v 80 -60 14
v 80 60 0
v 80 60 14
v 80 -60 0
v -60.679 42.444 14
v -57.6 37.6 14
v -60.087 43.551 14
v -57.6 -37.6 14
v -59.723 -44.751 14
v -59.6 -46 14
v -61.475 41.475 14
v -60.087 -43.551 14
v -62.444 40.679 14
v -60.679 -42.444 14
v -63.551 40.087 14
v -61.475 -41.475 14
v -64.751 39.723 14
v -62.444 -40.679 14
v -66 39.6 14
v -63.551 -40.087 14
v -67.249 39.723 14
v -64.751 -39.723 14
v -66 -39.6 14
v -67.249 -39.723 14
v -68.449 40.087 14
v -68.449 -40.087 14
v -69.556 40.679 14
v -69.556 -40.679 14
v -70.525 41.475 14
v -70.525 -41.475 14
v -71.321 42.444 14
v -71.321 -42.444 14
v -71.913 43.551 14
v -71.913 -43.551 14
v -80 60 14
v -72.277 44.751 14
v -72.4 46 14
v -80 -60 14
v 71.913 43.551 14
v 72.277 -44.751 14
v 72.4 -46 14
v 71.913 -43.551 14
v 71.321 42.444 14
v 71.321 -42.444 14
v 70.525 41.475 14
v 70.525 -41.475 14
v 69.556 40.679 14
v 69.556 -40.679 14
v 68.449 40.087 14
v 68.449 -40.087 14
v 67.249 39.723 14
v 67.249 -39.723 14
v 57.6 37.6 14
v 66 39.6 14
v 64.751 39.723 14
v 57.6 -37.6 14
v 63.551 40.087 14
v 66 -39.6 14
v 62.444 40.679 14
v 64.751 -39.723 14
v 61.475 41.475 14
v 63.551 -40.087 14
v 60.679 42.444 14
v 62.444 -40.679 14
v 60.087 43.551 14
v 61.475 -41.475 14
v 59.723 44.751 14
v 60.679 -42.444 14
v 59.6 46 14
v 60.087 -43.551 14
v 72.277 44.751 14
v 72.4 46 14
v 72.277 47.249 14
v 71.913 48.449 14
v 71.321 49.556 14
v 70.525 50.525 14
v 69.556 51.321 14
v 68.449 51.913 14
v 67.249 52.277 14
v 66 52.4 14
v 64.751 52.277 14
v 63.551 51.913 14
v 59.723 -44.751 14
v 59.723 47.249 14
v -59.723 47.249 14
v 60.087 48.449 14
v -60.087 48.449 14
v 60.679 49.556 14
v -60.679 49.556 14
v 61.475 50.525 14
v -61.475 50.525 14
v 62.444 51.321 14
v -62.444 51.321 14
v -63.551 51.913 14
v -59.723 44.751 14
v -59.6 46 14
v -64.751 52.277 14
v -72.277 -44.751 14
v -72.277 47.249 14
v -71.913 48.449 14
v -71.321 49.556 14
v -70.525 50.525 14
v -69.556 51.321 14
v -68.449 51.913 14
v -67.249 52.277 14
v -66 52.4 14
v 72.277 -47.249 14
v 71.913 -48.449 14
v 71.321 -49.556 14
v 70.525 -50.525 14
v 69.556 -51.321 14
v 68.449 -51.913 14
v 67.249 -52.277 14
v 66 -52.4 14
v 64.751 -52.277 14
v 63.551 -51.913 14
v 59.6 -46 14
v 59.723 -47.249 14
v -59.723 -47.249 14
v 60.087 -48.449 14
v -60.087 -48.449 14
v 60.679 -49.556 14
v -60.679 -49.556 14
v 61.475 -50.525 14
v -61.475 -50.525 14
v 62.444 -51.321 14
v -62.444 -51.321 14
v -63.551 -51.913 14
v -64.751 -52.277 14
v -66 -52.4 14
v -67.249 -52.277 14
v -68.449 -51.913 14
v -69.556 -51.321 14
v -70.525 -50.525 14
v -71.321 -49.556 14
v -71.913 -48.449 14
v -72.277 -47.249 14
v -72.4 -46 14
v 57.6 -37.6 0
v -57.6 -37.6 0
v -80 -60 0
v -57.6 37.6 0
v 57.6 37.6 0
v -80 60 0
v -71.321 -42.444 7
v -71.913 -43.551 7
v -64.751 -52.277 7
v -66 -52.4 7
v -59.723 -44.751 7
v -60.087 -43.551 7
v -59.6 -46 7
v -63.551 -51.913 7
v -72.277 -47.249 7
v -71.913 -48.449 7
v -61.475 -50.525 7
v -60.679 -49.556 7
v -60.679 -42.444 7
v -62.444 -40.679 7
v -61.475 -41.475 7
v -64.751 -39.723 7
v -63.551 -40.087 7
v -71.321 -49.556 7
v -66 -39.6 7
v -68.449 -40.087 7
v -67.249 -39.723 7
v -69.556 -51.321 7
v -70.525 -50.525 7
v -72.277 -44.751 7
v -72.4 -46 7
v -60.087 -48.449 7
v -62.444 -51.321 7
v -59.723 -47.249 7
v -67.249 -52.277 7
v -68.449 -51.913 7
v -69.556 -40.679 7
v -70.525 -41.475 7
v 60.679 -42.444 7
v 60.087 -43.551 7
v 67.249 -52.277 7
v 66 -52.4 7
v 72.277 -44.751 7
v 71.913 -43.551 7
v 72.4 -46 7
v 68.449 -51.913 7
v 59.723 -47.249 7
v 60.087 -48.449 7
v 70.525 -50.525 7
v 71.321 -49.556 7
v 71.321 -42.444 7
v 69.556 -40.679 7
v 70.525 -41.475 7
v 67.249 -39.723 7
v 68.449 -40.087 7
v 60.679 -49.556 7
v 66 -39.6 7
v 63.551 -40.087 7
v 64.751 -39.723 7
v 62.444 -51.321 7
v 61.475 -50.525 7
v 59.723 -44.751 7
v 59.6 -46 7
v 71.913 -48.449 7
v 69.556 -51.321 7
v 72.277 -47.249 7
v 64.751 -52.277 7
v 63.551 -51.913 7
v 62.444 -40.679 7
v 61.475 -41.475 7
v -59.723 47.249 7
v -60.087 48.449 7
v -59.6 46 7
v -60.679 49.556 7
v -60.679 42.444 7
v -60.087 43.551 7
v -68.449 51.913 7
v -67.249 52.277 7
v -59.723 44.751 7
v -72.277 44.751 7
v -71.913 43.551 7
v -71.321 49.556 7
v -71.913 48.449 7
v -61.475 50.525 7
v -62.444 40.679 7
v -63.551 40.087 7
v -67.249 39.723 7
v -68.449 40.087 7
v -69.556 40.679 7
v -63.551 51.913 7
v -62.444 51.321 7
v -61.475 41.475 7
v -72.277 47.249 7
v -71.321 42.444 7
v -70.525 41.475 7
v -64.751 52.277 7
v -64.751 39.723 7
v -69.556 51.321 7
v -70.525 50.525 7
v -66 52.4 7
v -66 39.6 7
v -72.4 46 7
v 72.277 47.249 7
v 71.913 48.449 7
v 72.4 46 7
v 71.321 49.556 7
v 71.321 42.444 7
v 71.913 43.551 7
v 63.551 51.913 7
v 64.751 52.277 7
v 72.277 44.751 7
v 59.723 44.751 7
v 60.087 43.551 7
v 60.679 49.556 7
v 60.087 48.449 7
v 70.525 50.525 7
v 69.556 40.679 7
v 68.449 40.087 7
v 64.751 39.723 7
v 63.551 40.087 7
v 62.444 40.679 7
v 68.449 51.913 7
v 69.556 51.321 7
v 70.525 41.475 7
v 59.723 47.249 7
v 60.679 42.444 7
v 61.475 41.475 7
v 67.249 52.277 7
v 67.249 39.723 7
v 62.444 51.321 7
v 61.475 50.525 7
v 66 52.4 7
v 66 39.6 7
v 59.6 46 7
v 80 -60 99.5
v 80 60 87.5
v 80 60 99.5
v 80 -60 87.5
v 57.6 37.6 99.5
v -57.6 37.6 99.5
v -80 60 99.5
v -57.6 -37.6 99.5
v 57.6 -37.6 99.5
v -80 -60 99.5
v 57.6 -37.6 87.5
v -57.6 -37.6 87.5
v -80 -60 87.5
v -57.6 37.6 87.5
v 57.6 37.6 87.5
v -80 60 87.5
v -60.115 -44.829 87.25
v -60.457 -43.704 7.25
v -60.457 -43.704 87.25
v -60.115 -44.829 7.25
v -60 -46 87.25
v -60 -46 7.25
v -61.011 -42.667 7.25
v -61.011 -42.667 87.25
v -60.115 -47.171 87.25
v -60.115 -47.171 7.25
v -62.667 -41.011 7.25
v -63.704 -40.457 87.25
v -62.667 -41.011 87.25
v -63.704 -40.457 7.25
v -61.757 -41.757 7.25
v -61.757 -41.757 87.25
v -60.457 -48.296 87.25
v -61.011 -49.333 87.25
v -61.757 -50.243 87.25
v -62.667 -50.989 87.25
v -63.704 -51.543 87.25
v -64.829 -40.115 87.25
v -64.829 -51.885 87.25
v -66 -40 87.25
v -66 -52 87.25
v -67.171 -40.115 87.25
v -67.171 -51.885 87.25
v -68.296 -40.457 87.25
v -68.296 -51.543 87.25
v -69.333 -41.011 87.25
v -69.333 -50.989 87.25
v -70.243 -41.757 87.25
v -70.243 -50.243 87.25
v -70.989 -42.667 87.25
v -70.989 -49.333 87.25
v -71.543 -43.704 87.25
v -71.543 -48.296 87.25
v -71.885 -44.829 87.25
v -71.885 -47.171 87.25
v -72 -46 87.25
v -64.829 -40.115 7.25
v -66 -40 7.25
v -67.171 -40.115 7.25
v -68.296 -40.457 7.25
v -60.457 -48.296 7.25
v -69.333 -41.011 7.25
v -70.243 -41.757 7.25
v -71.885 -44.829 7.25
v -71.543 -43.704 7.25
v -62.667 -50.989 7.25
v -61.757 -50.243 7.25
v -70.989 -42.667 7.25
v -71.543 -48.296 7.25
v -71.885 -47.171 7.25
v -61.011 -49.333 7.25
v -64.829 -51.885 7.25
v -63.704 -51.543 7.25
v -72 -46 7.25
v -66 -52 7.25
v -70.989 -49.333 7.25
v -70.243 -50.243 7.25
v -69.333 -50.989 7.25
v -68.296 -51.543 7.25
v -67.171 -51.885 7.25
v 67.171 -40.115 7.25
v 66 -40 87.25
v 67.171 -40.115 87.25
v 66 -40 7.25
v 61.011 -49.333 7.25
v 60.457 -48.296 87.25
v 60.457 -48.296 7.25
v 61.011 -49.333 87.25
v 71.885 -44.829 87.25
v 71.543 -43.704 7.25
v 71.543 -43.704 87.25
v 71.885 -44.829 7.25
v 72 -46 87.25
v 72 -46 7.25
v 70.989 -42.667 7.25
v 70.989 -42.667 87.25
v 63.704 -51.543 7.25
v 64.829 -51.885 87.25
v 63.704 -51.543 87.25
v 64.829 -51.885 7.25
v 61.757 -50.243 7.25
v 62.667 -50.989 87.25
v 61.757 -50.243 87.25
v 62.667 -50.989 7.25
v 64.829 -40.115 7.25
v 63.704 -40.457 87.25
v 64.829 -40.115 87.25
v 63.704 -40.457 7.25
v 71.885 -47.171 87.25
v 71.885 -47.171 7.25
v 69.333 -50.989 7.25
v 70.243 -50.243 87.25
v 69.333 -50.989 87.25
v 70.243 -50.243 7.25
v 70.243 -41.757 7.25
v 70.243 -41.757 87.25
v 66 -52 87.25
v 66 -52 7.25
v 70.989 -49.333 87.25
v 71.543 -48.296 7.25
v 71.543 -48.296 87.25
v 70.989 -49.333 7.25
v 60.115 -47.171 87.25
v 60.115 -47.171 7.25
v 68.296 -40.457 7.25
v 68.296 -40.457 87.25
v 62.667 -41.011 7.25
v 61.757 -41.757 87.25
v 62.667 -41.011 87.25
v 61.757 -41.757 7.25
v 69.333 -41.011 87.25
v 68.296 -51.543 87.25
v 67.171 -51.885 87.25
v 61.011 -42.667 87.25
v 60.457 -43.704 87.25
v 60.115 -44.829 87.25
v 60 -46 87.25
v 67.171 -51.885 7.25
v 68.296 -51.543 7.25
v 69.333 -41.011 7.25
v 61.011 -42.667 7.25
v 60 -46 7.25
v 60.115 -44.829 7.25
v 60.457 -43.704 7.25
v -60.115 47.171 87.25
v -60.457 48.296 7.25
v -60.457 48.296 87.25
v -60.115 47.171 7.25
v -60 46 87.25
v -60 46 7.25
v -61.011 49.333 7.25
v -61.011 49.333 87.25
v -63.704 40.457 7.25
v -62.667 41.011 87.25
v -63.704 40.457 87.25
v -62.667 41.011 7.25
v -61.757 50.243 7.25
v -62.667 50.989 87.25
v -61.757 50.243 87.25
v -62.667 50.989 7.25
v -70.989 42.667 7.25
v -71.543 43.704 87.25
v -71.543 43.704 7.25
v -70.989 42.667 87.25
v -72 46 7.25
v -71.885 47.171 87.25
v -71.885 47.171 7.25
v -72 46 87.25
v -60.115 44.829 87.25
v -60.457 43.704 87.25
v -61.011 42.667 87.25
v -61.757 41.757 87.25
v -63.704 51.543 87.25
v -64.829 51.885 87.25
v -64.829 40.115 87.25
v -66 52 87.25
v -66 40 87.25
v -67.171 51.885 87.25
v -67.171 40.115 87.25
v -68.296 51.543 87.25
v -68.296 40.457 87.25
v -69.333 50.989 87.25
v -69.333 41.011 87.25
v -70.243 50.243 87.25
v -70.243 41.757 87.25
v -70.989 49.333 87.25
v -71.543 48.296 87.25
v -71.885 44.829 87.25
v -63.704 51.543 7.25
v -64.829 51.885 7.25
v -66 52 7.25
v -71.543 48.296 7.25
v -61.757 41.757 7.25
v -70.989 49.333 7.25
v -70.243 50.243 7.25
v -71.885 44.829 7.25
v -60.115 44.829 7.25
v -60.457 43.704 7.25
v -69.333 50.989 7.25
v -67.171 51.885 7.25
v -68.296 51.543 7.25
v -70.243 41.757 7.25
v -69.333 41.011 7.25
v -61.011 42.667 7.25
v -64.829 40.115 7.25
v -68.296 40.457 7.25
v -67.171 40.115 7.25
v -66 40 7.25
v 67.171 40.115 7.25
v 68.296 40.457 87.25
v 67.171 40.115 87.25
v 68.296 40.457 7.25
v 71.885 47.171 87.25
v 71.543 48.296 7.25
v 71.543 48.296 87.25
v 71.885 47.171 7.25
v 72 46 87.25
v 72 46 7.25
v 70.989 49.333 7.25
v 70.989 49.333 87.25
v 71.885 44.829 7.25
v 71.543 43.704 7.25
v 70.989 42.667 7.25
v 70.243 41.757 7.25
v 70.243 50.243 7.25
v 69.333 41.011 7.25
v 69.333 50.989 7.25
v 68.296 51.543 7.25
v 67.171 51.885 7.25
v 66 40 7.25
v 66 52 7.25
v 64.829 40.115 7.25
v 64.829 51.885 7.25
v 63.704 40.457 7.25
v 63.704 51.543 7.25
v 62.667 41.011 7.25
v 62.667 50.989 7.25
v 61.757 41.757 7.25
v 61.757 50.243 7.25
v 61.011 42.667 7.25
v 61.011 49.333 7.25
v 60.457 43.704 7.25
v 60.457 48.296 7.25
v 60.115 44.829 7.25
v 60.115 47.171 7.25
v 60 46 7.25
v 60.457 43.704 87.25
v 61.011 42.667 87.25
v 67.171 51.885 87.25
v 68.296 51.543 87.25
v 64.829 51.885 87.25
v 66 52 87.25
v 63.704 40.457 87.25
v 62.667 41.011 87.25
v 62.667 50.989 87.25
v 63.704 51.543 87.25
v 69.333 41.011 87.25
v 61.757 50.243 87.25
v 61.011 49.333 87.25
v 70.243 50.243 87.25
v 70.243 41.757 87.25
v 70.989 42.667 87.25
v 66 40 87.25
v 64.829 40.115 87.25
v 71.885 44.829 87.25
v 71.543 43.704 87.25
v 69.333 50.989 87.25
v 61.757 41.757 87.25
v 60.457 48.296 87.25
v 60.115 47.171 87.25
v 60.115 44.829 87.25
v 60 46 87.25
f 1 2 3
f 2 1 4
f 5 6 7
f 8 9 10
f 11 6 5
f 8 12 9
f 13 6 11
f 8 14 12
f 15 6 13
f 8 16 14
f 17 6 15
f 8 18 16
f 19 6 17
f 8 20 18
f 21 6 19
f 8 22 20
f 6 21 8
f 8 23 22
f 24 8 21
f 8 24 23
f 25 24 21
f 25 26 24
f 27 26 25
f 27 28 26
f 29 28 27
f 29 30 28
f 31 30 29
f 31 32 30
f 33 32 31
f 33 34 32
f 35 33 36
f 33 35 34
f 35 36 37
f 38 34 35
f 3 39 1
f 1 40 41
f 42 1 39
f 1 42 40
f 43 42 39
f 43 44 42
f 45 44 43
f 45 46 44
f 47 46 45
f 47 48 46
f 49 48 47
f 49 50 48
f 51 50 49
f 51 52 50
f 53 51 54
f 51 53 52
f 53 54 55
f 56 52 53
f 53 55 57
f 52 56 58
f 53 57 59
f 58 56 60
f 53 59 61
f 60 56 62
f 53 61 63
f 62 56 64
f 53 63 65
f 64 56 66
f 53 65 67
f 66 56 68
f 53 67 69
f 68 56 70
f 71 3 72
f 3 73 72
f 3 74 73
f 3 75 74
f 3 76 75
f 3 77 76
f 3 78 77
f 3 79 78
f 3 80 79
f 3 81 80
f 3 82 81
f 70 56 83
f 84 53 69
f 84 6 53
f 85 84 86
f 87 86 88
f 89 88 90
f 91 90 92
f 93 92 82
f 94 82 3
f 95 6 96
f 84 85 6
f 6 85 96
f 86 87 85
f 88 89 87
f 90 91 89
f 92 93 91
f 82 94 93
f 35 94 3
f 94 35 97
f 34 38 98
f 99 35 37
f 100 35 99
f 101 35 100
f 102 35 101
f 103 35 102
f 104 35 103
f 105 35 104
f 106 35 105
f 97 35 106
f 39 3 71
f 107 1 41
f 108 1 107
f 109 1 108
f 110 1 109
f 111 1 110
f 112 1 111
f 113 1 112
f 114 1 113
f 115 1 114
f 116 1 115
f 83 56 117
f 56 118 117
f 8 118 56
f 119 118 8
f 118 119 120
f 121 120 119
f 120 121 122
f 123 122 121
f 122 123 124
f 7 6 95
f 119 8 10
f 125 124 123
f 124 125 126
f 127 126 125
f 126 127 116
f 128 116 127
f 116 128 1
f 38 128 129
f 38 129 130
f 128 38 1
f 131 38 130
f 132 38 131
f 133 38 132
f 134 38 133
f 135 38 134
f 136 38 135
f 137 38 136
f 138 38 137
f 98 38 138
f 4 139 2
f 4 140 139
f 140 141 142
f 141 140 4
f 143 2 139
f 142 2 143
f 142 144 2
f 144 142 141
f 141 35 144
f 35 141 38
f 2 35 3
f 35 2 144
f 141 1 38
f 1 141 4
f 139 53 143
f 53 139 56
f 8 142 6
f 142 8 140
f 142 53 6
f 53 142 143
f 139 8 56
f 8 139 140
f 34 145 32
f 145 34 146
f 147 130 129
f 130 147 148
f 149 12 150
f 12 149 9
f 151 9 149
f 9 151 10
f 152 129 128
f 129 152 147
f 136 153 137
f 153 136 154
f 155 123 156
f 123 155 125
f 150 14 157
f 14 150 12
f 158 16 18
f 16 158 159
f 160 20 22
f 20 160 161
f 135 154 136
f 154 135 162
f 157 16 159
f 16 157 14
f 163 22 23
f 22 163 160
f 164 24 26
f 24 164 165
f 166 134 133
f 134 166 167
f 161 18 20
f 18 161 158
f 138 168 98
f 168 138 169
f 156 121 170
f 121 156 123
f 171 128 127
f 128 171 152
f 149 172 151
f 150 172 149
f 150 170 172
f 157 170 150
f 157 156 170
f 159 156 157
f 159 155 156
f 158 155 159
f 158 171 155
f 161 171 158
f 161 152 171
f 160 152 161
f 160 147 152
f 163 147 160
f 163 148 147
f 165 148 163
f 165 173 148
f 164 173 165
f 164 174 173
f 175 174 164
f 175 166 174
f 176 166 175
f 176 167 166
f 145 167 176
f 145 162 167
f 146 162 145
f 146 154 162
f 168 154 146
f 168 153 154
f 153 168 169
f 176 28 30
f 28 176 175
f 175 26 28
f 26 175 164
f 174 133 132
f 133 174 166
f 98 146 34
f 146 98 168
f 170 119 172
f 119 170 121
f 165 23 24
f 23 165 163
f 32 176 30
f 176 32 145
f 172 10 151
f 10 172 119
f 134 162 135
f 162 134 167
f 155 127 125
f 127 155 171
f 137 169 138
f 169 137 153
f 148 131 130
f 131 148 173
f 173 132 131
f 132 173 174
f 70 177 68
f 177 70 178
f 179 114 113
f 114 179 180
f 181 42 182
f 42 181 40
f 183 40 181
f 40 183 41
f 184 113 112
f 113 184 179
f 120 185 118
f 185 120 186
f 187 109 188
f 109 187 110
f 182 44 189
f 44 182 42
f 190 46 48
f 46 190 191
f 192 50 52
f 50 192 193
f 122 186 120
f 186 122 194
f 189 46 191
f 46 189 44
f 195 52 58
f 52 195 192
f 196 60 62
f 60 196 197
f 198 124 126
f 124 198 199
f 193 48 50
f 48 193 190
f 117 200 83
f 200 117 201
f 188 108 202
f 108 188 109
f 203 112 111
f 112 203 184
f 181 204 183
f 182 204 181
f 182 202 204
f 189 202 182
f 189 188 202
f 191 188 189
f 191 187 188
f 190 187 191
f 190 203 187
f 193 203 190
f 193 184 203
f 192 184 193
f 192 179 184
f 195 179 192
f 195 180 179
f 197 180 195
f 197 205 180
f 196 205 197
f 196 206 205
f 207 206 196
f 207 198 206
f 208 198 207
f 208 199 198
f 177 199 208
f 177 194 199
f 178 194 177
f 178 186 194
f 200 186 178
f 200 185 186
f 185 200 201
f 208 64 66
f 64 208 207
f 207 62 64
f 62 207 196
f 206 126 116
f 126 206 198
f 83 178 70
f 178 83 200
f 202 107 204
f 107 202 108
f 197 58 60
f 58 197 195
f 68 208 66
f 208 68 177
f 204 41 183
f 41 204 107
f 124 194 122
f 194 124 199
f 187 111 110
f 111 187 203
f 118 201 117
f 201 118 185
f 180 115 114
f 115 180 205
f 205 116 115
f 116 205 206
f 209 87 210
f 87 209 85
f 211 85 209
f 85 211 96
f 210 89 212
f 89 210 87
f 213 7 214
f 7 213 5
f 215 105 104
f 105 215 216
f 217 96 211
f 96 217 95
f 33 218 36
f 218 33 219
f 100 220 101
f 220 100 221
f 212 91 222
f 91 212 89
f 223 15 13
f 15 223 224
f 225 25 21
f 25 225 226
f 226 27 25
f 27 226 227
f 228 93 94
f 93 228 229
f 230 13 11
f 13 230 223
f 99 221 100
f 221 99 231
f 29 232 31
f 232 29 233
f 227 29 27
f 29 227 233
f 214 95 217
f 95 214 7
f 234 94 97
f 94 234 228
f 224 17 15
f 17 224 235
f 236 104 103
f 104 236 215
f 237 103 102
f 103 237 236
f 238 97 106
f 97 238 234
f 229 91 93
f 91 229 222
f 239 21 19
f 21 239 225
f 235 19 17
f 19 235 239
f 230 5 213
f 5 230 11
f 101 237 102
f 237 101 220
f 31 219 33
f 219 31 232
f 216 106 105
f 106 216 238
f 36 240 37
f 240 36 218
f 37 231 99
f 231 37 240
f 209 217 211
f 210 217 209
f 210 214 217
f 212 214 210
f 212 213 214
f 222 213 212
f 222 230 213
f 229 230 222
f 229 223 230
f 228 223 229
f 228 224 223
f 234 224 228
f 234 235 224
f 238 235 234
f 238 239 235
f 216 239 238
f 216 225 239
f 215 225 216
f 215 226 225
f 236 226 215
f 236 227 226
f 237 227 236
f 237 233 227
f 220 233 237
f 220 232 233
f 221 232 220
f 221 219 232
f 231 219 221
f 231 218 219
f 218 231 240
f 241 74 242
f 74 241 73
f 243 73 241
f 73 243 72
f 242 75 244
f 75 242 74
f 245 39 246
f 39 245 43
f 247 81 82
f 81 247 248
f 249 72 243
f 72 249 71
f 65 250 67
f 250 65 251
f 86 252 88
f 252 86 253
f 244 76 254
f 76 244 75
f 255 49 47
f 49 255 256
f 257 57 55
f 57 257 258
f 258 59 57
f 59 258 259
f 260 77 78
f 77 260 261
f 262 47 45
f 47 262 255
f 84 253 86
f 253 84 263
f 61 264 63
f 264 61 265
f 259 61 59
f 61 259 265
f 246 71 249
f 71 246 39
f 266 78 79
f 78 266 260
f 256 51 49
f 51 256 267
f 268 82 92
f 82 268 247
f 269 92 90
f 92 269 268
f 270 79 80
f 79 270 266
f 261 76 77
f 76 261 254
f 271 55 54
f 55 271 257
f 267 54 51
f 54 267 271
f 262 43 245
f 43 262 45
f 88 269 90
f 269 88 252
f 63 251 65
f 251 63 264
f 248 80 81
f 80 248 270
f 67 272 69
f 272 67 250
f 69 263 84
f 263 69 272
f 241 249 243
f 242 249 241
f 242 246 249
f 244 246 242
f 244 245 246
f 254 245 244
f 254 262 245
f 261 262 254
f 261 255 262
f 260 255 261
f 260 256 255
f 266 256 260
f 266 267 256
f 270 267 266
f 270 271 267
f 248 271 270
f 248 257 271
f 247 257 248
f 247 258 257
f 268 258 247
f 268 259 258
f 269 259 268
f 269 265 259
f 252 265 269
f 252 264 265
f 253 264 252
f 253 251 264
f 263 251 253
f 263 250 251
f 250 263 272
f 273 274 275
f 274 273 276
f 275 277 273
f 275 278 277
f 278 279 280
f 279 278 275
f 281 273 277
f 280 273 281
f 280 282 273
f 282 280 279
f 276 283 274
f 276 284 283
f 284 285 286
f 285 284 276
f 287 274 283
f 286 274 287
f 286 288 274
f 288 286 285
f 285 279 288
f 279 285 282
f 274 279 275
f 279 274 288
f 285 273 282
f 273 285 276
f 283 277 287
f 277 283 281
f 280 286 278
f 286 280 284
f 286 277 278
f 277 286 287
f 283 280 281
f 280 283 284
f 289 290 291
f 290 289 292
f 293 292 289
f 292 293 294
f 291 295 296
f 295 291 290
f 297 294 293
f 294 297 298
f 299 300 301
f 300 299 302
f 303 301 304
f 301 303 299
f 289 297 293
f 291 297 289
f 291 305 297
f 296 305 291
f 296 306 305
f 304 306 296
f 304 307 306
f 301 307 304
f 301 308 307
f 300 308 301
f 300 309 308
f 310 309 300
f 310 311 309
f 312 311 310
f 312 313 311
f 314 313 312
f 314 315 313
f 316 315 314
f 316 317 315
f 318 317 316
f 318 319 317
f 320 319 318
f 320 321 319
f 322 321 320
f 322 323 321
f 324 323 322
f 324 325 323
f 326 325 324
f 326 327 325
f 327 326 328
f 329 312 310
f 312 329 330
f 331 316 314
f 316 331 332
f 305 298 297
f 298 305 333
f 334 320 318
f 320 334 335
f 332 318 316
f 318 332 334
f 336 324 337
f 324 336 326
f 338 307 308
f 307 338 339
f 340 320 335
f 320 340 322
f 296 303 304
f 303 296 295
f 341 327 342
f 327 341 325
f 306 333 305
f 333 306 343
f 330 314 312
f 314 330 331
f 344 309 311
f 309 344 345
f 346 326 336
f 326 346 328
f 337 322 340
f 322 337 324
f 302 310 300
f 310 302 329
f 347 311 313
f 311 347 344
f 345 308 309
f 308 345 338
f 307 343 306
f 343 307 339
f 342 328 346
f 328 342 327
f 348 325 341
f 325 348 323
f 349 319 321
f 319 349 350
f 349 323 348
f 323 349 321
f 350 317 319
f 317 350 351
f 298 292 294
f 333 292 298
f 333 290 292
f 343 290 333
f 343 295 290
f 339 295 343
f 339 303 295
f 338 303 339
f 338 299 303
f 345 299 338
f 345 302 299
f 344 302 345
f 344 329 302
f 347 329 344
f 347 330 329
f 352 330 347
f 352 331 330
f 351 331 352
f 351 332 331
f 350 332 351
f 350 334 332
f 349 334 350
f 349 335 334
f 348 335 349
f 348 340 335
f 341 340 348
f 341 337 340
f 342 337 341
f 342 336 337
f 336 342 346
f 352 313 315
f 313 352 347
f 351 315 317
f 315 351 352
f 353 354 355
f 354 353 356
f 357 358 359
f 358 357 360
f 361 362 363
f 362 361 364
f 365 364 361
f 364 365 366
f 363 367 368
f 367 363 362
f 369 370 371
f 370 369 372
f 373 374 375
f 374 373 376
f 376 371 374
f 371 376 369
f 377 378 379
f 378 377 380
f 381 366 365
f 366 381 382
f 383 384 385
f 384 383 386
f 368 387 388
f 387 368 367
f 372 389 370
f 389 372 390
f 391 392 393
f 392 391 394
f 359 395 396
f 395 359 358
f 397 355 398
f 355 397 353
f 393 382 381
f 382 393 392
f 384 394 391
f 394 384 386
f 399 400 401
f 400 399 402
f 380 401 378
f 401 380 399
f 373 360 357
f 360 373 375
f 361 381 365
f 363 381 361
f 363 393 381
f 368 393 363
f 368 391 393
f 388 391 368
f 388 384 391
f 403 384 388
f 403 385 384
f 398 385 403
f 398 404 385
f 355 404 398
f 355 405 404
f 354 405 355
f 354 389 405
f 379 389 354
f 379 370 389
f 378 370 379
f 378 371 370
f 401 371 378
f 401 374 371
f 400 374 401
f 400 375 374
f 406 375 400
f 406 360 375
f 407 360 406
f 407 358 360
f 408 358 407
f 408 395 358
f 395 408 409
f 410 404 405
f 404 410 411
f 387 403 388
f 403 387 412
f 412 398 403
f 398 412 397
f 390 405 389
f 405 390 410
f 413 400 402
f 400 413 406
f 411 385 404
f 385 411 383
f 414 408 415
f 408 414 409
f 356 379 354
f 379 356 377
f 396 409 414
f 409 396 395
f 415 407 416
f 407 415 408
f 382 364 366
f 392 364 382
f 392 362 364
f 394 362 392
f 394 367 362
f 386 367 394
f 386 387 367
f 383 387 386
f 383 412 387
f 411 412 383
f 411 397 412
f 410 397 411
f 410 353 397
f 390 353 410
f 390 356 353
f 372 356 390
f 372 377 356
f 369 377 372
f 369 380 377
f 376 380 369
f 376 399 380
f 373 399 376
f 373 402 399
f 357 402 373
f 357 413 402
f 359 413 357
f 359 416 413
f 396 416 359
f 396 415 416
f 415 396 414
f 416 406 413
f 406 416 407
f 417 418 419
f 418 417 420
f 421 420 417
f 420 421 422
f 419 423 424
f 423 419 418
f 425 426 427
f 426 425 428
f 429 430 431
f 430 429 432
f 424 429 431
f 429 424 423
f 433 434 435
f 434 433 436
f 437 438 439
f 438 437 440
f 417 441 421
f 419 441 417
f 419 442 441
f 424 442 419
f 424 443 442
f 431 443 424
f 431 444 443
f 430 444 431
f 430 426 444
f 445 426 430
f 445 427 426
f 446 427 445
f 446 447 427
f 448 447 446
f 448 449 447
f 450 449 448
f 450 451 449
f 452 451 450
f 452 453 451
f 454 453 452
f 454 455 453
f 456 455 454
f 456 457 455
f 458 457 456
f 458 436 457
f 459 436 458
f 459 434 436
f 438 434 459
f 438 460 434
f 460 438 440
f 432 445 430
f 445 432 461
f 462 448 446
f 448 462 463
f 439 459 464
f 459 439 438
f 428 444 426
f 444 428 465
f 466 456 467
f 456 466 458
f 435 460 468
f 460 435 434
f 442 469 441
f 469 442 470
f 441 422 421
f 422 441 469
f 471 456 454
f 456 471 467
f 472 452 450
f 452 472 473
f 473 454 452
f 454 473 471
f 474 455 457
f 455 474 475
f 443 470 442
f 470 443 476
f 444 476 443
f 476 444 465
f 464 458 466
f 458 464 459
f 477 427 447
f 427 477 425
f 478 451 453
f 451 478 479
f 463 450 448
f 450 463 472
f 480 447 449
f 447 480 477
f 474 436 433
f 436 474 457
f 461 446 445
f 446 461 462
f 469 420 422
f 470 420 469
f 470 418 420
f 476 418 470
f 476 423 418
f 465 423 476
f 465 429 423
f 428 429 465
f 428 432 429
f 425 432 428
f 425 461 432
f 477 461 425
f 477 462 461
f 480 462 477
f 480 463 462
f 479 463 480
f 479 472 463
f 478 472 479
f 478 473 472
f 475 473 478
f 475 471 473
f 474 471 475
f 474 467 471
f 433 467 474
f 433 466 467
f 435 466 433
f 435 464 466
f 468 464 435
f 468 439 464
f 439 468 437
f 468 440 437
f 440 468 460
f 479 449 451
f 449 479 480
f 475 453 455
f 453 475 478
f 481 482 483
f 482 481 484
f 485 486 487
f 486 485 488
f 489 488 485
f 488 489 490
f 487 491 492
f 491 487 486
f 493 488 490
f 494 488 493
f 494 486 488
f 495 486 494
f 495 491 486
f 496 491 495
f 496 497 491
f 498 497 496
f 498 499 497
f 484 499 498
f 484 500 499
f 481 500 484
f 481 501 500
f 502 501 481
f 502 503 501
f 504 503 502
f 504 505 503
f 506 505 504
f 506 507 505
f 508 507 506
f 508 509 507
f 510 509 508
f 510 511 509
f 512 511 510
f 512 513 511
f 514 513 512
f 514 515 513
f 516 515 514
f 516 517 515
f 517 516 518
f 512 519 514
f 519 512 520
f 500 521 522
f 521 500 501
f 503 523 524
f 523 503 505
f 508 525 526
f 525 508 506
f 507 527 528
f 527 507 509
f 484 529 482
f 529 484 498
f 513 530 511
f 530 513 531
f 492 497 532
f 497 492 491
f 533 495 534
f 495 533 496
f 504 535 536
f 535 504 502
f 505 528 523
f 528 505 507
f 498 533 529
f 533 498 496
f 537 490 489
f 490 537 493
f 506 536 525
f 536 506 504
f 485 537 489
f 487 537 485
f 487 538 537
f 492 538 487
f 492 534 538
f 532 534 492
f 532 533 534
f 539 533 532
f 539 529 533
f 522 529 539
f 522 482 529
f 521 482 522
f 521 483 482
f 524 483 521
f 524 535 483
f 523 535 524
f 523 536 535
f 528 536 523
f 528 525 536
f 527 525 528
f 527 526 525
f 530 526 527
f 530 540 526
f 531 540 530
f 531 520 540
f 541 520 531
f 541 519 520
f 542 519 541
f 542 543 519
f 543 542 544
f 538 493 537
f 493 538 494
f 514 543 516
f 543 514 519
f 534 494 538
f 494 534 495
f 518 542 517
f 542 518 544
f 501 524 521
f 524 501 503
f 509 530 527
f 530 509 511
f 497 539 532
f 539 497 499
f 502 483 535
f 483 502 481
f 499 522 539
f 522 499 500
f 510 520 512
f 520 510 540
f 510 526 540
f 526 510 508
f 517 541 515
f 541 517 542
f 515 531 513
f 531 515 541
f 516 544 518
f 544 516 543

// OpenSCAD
$fn = 32;

// ------------------------------------------------------------------------
// Frame cube: base 160 x 120 mm, posts 80 mm tall
// Every part is its own module, assembly() places every instance.
// ------------------------------------------------------------------------

// --- part 1 ---
module base_frame() {
  difference() {
    translate([-80, -60, 0]) cube([160, 120, 14]);
    translate([-57.6, -37.6, -1]) cube([115.2, 75.2, 16]);
    translate([-66, -46, 7]) cylinder(h = 8, d = 12.8);
    translate([66, -46, 7]) cylinder(h = 8, d = 12.8);
    translate([-66, 46, 7]) cylinder(h = 8, d = 12.8);
    translate([66, 46, 7]) cylinder(h = 8, d = 12.8);
  }
}

// --- part 2 ---
module corner_post() {
  cylinder(h = 80, d = 12);
}

// --- part 3 ---
module top_frame() {
  difference() {
    translate([-80, -60, 0]) cube([160, 120, 12]);
    translate([-57.6, -37.6, -1]) cube([115.2, 75.2, 14]);
  }
}

// --- assembly ---
module assembly() {
  color([0.80, 0.24, 0.20]) translate([0, 0, 0]) rotate([0, 0, 0]) base_frame();
  color([0.20, 0.45, 0.75]) translate([-66, -46, 7.25]) rotate([0, 0, 0]) corner_post();
  color([0.25, 0.62, 0.32]) translate([66, -46, 7.25]) rotate([0, 0, 0]) corner_post();
  color([0.92, 0.70, 0.18]) translate([-66, 46, 7.25]) rotate([0, 0, 0]) corner_post();
  color([0.58, 0.35, 0.70]) translate([66, 46, 7.25]) rotate([0, 0, 0]) corner_post();
  color([0.16, 0.66, 0.66]) translate([0, 0, 87.5]) rotate([0, 0, 0]) top_frame();
}

assembly();
